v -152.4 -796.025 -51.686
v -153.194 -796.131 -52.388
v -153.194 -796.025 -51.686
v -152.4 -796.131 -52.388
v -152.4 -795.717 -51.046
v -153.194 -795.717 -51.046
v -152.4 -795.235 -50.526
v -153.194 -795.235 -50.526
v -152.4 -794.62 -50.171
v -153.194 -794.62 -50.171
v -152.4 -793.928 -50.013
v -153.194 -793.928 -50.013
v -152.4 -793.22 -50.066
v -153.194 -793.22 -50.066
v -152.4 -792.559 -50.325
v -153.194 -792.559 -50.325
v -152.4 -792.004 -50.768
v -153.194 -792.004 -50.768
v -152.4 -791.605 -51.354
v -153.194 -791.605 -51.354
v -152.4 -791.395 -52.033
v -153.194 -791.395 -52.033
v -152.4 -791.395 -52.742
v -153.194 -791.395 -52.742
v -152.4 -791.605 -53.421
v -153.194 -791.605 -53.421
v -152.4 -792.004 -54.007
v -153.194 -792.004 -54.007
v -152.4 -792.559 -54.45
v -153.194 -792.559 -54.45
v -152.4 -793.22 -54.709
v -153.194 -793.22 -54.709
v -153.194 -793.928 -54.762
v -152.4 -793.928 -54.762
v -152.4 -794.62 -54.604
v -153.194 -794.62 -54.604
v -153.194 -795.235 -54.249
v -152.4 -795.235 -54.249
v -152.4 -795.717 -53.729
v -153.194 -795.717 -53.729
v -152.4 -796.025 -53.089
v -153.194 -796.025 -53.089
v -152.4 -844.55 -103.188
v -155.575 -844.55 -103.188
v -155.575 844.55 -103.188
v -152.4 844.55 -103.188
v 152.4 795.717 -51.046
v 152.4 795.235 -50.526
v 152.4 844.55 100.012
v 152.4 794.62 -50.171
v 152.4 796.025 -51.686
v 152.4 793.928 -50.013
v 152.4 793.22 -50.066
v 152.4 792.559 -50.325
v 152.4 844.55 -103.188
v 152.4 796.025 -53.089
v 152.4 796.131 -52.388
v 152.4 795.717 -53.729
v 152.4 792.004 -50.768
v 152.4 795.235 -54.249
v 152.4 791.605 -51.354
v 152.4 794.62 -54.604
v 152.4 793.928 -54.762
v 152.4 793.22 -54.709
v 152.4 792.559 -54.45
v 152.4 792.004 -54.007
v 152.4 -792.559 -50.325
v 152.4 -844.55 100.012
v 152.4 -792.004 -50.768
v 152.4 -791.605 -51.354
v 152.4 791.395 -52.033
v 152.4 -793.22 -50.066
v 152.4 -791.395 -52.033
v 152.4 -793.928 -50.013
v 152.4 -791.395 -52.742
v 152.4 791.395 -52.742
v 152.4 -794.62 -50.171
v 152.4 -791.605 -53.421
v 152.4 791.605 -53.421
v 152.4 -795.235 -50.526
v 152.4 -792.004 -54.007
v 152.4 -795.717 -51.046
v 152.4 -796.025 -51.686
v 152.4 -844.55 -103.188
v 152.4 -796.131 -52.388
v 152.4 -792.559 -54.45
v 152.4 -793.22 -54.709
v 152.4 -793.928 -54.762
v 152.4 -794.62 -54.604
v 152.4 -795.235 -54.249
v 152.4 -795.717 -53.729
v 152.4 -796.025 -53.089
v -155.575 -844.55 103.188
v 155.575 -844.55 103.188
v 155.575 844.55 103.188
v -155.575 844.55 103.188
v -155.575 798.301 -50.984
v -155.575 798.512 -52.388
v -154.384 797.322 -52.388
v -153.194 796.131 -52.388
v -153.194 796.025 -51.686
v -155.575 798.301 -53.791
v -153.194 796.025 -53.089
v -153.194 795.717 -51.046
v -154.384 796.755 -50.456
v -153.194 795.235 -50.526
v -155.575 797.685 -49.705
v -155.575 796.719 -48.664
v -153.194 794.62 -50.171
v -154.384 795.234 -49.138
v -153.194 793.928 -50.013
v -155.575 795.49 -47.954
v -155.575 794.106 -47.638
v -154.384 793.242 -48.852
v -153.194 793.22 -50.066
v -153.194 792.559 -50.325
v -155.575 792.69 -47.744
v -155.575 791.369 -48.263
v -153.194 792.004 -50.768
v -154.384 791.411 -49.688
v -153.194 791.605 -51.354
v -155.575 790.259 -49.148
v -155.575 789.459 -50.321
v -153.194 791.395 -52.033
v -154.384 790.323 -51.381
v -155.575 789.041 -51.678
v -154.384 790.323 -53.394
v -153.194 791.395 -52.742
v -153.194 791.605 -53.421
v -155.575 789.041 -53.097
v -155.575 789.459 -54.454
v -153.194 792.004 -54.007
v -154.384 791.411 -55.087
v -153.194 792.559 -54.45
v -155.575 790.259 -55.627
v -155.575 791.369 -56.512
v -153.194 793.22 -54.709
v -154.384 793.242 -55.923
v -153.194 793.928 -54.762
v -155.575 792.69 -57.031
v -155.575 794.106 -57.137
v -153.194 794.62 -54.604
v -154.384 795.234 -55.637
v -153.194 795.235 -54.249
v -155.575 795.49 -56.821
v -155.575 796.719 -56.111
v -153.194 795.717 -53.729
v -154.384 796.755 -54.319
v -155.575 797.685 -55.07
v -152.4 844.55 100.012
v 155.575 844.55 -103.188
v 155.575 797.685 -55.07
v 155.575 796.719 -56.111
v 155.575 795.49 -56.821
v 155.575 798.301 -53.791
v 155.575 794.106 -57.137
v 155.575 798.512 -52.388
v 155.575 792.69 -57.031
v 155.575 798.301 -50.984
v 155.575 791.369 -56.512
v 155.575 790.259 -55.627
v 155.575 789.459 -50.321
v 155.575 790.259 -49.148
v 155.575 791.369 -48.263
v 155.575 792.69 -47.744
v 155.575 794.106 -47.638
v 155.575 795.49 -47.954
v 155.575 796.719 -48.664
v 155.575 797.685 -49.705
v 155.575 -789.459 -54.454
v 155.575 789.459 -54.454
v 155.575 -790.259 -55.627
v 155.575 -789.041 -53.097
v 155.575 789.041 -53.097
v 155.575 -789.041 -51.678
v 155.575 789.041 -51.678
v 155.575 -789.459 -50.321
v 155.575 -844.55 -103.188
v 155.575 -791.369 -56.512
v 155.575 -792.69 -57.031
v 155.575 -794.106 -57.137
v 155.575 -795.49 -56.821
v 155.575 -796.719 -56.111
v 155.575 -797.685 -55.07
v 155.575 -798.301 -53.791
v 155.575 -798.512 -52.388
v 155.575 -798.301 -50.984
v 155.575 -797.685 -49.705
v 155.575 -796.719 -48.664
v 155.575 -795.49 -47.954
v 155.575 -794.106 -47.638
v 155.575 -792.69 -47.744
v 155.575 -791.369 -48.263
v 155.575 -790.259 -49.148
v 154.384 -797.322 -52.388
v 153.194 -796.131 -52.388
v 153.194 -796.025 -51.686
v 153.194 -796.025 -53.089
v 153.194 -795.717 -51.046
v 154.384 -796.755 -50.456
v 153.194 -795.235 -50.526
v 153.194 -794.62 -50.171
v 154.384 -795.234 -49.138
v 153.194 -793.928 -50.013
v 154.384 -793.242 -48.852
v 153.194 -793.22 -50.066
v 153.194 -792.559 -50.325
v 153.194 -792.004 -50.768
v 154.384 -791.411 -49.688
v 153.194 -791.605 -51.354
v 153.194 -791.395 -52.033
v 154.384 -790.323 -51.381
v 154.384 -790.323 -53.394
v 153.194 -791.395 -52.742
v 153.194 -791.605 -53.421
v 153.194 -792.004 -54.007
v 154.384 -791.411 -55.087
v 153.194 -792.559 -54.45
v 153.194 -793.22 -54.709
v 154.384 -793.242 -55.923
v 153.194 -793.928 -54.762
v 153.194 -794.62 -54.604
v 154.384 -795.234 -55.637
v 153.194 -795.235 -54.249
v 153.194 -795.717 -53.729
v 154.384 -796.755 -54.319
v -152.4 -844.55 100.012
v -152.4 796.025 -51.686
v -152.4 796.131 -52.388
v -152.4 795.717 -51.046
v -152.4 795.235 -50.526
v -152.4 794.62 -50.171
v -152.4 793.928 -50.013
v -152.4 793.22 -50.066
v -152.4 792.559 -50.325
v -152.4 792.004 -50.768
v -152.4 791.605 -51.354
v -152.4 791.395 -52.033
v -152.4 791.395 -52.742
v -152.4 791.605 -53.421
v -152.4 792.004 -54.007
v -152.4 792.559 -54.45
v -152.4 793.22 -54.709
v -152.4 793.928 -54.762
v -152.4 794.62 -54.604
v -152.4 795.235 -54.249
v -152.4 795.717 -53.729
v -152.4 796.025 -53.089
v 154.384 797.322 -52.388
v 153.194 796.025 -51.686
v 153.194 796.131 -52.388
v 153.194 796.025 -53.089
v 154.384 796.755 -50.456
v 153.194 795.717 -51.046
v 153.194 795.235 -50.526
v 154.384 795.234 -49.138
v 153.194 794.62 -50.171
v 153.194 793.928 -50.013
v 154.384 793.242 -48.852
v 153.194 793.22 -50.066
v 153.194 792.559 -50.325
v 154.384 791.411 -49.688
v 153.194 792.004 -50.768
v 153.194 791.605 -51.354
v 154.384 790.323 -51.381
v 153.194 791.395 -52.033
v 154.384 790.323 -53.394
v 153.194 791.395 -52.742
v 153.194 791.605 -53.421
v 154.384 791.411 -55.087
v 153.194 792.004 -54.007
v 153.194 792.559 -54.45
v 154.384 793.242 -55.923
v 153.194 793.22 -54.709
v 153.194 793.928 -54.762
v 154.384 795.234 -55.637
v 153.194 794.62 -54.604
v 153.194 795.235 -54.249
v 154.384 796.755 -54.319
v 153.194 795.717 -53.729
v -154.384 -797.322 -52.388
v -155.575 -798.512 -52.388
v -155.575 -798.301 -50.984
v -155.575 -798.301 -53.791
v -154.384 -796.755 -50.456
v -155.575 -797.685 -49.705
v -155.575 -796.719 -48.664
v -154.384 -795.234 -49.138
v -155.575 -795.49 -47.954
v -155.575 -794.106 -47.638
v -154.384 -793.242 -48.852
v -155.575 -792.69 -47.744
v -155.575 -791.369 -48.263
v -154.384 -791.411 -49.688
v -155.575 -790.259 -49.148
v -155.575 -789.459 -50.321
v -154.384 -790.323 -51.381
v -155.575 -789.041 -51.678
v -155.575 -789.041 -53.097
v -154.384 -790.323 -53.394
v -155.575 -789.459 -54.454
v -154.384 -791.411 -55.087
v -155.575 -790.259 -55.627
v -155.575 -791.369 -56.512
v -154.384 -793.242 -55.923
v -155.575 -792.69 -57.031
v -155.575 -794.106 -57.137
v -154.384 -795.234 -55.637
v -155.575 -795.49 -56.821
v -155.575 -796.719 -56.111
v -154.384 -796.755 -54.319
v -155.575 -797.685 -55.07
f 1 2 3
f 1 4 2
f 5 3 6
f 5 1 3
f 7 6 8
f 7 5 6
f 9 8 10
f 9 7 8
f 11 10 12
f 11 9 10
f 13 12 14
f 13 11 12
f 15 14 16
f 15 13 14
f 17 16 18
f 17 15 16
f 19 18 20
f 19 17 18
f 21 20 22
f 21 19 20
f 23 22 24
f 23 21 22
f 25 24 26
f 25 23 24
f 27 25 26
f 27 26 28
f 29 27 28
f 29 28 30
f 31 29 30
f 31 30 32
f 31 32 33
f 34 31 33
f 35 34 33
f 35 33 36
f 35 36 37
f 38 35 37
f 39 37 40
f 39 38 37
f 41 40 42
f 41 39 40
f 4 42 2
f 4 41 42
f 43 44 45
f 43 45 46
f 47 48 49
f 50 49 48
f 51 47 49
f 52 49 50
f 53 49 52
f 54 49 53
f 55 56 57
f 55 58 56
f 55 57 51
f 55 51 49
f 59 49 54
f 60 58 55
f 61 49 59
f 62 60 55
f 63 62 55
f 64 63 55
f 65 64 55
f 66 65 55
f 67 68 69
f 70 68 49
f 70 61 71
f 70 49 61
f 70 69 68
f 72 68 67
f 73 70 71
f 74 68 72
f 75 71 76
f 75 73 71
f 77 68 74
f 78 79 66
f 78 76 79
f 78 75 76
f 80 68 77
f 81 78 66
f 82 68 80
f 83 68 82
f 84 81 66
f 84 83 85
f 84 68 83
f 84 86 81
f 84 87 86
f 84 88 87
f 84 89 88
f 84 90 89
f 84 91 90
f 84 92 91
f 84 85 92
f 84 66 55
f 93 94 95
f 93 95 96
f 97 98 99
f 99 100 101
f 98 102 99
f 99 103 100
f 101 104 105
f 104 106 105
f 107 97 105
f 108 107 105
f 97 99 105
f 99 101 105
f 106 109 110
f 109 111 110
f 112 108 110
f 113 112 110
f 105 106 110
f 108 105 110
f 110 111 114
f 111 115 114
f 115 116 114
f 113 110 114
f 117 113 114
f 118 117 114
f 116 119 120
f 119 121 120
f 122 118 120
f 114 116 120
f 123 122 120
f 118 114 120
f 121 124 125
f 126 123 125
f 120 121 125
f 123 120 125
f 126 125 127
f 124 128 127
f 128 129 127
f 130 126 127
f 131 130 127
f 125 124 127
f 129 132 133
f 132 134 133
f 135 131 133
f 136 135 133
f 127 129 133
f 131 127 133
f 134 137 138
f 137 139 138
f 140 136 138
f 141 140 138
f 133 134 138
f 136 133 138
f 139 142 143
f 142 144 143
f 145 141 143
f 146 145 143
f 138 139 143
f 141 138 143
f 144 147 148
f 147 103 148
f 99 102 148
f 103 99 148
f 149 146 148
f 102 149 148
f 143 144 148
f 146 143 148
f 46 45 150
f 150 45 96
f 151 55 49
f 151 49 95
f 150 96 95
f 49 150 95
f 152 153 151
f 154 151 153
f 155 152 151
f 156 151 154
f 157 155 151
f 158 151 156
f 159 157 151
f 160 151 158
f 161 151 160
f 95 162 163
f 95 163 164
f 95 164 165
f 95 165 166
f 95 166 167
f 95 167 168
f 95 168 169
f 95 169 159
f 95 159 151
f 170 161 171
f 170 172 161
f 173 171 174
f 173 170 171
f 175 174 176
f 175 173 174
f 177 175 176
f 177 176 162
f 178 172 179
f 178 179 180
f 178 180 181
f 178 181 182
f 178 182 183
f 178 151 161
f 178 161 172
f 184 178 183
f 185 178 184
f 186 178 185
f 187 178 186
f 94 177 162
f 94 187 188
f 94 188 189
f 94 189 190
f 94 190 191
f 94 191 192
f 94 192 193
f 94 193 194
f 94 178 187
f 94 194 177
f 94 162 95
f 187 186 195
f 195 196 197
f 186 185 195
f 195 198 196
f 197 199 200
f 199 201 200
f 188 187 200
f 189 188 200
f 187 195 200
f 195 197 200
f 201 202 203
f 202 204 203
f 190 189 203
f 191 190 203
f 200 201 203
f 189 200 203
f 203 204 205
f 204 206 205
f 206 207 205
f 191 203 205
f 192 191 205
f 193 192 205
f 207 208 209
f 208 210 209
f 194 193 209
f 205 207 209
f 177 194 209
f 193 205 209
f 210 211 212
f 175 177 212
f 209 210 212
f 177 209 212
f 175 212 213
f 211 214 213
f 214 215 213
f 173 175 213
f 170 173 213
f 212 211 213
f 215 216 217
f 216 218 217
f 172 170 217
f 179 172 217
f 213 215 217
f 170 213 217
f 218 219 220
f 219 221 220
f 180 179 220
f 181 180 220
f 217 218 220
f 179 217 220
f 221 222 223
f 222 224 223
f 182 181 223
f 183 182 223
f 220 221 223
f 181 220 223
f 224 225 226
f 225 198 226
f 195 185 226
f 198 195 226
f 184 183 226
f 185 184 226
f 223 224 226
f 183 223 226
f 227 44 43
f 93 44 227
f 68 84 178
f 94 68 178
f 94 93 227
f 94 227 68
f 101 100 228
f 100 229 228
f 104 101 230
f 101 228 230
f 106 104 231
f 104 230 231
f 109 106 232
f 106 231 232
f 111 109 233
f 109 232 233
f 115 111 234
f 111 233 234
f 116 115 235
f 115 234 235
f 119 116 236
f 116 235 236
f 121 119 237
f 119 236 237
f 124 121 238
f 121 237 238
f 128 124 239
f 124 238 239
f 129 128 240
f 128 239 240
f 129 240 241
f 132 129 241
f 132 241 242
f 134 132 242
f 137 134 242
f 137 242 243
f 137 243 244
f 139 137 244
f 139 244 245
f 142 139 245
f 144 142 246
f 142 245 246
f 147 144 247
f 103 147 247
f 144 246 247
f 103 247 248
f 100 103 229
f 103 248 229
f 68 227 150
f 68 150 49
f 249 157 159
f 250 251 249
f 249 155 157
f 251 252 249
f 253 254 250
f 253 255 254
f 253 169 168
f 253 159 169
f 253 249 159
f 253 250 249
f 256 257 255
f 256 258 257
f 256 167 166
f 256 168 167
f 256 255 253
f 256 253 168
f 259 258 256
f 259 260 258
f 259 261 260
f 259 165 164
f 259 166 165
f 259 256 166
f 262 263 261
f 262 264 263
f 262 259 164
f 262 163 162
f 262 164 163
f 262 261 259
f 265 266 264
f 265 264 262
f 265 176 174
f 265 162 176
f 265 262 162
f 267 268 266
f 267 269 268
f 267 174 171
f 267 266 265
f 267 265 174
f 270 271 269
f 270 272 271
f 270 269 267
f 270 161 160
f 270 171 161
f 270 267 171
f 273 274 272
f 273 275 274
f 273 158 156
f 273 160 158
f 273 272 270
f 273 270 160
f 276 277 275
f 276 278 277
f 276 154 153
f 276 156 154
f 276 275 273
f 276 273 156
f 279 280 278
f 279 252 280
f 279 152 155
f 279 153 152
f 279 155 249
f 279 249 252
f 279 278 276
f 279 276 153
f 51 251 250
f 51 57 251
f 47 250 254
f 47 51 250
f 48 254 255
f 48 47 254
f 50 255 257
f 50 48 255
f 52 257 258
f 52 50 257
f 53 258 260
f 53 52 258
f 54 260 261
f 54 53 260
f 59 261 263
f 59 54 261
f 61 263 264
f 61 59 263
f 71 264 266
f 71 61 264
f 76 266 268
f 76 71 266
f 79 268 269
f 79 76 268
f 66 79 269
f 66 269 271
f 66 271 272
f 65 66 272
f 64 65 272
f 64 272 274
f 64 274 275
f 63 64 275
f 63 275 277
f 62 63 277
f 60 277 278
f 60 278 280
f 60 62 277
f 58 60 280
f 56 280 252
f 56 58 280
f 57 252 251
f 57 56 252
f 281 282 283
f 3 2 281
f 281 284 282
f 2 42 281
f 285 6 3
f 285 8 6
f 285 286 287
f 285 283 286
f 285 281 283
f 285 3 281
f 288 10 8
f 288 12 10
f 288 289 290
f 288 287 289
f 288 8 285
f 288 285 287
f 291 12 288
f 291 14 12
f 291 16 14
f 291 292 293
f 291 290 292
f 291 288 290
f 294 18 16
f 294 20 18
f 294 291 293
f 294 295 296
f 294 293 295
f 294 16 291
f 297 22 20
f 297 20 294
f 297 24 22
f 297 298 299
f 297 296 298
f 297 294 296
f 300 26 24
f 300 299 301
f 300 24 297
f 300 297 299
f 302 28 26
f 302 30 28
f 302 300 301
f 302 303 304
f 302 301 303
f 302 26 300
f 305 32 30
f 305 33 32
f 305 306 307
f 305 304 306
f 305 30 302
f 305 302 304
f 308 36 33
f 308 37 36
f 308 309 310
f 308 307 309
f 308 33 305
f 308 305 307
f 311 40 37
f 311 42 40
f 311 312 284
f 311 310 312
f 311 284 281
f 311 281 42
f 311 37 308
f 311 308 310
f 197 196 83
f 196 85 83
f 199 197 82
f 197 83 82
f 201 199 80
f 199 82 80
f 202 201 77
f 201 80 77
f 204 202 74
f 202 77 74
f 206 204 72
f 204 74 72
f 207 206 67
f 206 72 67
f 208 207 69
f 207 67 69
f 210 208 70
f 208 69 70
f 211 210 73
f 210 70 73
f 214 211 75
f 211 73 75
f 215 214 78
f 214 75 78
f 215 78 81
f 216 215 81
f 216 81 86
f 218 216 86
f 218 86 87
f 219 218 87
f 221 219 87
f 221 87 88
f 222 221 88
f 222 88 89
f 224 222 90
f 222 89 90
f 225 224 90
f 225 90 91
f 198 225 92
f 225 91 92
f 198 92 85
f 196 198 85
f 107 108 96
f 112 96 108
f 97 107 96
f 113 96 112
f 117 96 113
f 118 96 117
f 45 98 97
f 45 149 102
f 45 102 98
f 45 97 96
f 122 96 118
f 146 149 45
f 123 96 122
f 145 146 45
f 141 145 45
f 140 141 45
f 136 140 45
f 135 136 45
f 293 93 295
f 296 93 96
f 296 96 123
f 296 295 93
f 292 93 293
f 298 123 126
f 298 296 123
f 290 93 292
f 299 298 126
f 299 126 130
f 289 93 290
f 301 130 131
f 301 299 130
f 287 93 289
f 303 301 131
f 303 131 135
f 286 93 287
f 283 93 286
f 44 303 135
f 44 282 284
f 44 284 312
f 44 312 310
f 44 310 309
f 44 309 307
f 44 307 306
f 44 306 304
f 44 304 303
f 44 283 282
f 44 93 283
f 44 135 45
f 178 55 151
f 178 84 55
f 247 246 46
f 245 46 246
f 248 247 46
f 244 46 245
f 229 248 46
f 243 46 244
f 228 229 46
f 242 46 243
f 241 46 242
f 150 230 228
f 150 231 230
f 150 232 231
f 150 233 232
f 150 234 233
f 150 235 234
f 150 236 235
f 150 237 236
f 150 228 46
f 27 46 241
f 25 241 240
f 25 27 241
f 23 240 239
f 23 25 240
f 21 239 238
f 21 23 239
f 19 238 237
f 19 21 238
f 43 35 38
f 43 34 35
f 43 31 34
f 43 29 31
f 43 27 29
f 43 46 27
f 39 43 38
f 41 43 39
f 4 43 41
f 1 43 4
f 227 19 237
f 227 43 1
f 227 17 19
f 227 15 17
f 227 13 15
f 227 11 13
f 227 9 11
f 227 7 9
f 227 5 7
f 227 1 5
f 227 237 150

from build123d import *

# Parameters (mm, degrees)
F1_DEPTH         = 844.55
F3_D             = 4.7625
F3_DEPTH         = 25.4
F3_CSINK_D       = 9.525
F3_CSINK_ANGLE   = 90
F3_TIP           = 1.4307993491
F3_COPIES2_COUNT = 2


# Not quite as in the source:
# - a pattern or mirror of a feature is missing from the dataset's text; its kind, count and spacing are read off the source's solid


with BuildPart() as f1:
    # F0 (on Front) → F1 (new body, symmetric)
    with BuildSketch(Plane.XZ):
        Polygon((155.575, -103.1875), (155.575, 103.1875), (-155.575, 103.1875), (-155.575, -103.1875), (-152.4, -103.1875), (-152.4, 100.0125), (152.4, 100.0125), (152.4, -103.1875), align=None)
    extrude(amount=F1_DEPTH, both=True)

    # F3
    with Locations(Plane.YZ.offset(155.575)):
        with Locations((-793.75, -52.3875)):
            f3 = CounterSinkHole(F3_D / 2, F3_CSINK_D / 2, depth=F3_DEPTH, counter_sink_angle=F3_CSINK_ANGLE)
            with Locations((0, 0, -(F3_DEPTH + F3_TIP / 2))):  # 118° drill point
                Cone(0, F3_D / 2, F3_TIP, mode=Mode.SUBTRACT)

    # F3_copies: F3 across plane
    add(f3.mirror(Plane(origin=(0, 0, 0), x_dir=(0, 0, -1), z_dir=(-1, 0, 0))), mode=Mode.SUBTRACT)

    # F3_copies1: F3 across plane
    add(f3.mirror(Plane.ZX), mode=Mode.SUBTRACT)

    # F3_copies2: F3 ×2 about axis
    f3_copies2_axis = Axis((0, 0, 0), (0, 0, 1))
    for i in range(1, F3_COPIES2_COUNT):
        add(f3.rotate(f3_copies2_axis, i * 360 / F3_COPIES2_COUNT), mode=Mode.SUBTRACT)


solid = f1.part
